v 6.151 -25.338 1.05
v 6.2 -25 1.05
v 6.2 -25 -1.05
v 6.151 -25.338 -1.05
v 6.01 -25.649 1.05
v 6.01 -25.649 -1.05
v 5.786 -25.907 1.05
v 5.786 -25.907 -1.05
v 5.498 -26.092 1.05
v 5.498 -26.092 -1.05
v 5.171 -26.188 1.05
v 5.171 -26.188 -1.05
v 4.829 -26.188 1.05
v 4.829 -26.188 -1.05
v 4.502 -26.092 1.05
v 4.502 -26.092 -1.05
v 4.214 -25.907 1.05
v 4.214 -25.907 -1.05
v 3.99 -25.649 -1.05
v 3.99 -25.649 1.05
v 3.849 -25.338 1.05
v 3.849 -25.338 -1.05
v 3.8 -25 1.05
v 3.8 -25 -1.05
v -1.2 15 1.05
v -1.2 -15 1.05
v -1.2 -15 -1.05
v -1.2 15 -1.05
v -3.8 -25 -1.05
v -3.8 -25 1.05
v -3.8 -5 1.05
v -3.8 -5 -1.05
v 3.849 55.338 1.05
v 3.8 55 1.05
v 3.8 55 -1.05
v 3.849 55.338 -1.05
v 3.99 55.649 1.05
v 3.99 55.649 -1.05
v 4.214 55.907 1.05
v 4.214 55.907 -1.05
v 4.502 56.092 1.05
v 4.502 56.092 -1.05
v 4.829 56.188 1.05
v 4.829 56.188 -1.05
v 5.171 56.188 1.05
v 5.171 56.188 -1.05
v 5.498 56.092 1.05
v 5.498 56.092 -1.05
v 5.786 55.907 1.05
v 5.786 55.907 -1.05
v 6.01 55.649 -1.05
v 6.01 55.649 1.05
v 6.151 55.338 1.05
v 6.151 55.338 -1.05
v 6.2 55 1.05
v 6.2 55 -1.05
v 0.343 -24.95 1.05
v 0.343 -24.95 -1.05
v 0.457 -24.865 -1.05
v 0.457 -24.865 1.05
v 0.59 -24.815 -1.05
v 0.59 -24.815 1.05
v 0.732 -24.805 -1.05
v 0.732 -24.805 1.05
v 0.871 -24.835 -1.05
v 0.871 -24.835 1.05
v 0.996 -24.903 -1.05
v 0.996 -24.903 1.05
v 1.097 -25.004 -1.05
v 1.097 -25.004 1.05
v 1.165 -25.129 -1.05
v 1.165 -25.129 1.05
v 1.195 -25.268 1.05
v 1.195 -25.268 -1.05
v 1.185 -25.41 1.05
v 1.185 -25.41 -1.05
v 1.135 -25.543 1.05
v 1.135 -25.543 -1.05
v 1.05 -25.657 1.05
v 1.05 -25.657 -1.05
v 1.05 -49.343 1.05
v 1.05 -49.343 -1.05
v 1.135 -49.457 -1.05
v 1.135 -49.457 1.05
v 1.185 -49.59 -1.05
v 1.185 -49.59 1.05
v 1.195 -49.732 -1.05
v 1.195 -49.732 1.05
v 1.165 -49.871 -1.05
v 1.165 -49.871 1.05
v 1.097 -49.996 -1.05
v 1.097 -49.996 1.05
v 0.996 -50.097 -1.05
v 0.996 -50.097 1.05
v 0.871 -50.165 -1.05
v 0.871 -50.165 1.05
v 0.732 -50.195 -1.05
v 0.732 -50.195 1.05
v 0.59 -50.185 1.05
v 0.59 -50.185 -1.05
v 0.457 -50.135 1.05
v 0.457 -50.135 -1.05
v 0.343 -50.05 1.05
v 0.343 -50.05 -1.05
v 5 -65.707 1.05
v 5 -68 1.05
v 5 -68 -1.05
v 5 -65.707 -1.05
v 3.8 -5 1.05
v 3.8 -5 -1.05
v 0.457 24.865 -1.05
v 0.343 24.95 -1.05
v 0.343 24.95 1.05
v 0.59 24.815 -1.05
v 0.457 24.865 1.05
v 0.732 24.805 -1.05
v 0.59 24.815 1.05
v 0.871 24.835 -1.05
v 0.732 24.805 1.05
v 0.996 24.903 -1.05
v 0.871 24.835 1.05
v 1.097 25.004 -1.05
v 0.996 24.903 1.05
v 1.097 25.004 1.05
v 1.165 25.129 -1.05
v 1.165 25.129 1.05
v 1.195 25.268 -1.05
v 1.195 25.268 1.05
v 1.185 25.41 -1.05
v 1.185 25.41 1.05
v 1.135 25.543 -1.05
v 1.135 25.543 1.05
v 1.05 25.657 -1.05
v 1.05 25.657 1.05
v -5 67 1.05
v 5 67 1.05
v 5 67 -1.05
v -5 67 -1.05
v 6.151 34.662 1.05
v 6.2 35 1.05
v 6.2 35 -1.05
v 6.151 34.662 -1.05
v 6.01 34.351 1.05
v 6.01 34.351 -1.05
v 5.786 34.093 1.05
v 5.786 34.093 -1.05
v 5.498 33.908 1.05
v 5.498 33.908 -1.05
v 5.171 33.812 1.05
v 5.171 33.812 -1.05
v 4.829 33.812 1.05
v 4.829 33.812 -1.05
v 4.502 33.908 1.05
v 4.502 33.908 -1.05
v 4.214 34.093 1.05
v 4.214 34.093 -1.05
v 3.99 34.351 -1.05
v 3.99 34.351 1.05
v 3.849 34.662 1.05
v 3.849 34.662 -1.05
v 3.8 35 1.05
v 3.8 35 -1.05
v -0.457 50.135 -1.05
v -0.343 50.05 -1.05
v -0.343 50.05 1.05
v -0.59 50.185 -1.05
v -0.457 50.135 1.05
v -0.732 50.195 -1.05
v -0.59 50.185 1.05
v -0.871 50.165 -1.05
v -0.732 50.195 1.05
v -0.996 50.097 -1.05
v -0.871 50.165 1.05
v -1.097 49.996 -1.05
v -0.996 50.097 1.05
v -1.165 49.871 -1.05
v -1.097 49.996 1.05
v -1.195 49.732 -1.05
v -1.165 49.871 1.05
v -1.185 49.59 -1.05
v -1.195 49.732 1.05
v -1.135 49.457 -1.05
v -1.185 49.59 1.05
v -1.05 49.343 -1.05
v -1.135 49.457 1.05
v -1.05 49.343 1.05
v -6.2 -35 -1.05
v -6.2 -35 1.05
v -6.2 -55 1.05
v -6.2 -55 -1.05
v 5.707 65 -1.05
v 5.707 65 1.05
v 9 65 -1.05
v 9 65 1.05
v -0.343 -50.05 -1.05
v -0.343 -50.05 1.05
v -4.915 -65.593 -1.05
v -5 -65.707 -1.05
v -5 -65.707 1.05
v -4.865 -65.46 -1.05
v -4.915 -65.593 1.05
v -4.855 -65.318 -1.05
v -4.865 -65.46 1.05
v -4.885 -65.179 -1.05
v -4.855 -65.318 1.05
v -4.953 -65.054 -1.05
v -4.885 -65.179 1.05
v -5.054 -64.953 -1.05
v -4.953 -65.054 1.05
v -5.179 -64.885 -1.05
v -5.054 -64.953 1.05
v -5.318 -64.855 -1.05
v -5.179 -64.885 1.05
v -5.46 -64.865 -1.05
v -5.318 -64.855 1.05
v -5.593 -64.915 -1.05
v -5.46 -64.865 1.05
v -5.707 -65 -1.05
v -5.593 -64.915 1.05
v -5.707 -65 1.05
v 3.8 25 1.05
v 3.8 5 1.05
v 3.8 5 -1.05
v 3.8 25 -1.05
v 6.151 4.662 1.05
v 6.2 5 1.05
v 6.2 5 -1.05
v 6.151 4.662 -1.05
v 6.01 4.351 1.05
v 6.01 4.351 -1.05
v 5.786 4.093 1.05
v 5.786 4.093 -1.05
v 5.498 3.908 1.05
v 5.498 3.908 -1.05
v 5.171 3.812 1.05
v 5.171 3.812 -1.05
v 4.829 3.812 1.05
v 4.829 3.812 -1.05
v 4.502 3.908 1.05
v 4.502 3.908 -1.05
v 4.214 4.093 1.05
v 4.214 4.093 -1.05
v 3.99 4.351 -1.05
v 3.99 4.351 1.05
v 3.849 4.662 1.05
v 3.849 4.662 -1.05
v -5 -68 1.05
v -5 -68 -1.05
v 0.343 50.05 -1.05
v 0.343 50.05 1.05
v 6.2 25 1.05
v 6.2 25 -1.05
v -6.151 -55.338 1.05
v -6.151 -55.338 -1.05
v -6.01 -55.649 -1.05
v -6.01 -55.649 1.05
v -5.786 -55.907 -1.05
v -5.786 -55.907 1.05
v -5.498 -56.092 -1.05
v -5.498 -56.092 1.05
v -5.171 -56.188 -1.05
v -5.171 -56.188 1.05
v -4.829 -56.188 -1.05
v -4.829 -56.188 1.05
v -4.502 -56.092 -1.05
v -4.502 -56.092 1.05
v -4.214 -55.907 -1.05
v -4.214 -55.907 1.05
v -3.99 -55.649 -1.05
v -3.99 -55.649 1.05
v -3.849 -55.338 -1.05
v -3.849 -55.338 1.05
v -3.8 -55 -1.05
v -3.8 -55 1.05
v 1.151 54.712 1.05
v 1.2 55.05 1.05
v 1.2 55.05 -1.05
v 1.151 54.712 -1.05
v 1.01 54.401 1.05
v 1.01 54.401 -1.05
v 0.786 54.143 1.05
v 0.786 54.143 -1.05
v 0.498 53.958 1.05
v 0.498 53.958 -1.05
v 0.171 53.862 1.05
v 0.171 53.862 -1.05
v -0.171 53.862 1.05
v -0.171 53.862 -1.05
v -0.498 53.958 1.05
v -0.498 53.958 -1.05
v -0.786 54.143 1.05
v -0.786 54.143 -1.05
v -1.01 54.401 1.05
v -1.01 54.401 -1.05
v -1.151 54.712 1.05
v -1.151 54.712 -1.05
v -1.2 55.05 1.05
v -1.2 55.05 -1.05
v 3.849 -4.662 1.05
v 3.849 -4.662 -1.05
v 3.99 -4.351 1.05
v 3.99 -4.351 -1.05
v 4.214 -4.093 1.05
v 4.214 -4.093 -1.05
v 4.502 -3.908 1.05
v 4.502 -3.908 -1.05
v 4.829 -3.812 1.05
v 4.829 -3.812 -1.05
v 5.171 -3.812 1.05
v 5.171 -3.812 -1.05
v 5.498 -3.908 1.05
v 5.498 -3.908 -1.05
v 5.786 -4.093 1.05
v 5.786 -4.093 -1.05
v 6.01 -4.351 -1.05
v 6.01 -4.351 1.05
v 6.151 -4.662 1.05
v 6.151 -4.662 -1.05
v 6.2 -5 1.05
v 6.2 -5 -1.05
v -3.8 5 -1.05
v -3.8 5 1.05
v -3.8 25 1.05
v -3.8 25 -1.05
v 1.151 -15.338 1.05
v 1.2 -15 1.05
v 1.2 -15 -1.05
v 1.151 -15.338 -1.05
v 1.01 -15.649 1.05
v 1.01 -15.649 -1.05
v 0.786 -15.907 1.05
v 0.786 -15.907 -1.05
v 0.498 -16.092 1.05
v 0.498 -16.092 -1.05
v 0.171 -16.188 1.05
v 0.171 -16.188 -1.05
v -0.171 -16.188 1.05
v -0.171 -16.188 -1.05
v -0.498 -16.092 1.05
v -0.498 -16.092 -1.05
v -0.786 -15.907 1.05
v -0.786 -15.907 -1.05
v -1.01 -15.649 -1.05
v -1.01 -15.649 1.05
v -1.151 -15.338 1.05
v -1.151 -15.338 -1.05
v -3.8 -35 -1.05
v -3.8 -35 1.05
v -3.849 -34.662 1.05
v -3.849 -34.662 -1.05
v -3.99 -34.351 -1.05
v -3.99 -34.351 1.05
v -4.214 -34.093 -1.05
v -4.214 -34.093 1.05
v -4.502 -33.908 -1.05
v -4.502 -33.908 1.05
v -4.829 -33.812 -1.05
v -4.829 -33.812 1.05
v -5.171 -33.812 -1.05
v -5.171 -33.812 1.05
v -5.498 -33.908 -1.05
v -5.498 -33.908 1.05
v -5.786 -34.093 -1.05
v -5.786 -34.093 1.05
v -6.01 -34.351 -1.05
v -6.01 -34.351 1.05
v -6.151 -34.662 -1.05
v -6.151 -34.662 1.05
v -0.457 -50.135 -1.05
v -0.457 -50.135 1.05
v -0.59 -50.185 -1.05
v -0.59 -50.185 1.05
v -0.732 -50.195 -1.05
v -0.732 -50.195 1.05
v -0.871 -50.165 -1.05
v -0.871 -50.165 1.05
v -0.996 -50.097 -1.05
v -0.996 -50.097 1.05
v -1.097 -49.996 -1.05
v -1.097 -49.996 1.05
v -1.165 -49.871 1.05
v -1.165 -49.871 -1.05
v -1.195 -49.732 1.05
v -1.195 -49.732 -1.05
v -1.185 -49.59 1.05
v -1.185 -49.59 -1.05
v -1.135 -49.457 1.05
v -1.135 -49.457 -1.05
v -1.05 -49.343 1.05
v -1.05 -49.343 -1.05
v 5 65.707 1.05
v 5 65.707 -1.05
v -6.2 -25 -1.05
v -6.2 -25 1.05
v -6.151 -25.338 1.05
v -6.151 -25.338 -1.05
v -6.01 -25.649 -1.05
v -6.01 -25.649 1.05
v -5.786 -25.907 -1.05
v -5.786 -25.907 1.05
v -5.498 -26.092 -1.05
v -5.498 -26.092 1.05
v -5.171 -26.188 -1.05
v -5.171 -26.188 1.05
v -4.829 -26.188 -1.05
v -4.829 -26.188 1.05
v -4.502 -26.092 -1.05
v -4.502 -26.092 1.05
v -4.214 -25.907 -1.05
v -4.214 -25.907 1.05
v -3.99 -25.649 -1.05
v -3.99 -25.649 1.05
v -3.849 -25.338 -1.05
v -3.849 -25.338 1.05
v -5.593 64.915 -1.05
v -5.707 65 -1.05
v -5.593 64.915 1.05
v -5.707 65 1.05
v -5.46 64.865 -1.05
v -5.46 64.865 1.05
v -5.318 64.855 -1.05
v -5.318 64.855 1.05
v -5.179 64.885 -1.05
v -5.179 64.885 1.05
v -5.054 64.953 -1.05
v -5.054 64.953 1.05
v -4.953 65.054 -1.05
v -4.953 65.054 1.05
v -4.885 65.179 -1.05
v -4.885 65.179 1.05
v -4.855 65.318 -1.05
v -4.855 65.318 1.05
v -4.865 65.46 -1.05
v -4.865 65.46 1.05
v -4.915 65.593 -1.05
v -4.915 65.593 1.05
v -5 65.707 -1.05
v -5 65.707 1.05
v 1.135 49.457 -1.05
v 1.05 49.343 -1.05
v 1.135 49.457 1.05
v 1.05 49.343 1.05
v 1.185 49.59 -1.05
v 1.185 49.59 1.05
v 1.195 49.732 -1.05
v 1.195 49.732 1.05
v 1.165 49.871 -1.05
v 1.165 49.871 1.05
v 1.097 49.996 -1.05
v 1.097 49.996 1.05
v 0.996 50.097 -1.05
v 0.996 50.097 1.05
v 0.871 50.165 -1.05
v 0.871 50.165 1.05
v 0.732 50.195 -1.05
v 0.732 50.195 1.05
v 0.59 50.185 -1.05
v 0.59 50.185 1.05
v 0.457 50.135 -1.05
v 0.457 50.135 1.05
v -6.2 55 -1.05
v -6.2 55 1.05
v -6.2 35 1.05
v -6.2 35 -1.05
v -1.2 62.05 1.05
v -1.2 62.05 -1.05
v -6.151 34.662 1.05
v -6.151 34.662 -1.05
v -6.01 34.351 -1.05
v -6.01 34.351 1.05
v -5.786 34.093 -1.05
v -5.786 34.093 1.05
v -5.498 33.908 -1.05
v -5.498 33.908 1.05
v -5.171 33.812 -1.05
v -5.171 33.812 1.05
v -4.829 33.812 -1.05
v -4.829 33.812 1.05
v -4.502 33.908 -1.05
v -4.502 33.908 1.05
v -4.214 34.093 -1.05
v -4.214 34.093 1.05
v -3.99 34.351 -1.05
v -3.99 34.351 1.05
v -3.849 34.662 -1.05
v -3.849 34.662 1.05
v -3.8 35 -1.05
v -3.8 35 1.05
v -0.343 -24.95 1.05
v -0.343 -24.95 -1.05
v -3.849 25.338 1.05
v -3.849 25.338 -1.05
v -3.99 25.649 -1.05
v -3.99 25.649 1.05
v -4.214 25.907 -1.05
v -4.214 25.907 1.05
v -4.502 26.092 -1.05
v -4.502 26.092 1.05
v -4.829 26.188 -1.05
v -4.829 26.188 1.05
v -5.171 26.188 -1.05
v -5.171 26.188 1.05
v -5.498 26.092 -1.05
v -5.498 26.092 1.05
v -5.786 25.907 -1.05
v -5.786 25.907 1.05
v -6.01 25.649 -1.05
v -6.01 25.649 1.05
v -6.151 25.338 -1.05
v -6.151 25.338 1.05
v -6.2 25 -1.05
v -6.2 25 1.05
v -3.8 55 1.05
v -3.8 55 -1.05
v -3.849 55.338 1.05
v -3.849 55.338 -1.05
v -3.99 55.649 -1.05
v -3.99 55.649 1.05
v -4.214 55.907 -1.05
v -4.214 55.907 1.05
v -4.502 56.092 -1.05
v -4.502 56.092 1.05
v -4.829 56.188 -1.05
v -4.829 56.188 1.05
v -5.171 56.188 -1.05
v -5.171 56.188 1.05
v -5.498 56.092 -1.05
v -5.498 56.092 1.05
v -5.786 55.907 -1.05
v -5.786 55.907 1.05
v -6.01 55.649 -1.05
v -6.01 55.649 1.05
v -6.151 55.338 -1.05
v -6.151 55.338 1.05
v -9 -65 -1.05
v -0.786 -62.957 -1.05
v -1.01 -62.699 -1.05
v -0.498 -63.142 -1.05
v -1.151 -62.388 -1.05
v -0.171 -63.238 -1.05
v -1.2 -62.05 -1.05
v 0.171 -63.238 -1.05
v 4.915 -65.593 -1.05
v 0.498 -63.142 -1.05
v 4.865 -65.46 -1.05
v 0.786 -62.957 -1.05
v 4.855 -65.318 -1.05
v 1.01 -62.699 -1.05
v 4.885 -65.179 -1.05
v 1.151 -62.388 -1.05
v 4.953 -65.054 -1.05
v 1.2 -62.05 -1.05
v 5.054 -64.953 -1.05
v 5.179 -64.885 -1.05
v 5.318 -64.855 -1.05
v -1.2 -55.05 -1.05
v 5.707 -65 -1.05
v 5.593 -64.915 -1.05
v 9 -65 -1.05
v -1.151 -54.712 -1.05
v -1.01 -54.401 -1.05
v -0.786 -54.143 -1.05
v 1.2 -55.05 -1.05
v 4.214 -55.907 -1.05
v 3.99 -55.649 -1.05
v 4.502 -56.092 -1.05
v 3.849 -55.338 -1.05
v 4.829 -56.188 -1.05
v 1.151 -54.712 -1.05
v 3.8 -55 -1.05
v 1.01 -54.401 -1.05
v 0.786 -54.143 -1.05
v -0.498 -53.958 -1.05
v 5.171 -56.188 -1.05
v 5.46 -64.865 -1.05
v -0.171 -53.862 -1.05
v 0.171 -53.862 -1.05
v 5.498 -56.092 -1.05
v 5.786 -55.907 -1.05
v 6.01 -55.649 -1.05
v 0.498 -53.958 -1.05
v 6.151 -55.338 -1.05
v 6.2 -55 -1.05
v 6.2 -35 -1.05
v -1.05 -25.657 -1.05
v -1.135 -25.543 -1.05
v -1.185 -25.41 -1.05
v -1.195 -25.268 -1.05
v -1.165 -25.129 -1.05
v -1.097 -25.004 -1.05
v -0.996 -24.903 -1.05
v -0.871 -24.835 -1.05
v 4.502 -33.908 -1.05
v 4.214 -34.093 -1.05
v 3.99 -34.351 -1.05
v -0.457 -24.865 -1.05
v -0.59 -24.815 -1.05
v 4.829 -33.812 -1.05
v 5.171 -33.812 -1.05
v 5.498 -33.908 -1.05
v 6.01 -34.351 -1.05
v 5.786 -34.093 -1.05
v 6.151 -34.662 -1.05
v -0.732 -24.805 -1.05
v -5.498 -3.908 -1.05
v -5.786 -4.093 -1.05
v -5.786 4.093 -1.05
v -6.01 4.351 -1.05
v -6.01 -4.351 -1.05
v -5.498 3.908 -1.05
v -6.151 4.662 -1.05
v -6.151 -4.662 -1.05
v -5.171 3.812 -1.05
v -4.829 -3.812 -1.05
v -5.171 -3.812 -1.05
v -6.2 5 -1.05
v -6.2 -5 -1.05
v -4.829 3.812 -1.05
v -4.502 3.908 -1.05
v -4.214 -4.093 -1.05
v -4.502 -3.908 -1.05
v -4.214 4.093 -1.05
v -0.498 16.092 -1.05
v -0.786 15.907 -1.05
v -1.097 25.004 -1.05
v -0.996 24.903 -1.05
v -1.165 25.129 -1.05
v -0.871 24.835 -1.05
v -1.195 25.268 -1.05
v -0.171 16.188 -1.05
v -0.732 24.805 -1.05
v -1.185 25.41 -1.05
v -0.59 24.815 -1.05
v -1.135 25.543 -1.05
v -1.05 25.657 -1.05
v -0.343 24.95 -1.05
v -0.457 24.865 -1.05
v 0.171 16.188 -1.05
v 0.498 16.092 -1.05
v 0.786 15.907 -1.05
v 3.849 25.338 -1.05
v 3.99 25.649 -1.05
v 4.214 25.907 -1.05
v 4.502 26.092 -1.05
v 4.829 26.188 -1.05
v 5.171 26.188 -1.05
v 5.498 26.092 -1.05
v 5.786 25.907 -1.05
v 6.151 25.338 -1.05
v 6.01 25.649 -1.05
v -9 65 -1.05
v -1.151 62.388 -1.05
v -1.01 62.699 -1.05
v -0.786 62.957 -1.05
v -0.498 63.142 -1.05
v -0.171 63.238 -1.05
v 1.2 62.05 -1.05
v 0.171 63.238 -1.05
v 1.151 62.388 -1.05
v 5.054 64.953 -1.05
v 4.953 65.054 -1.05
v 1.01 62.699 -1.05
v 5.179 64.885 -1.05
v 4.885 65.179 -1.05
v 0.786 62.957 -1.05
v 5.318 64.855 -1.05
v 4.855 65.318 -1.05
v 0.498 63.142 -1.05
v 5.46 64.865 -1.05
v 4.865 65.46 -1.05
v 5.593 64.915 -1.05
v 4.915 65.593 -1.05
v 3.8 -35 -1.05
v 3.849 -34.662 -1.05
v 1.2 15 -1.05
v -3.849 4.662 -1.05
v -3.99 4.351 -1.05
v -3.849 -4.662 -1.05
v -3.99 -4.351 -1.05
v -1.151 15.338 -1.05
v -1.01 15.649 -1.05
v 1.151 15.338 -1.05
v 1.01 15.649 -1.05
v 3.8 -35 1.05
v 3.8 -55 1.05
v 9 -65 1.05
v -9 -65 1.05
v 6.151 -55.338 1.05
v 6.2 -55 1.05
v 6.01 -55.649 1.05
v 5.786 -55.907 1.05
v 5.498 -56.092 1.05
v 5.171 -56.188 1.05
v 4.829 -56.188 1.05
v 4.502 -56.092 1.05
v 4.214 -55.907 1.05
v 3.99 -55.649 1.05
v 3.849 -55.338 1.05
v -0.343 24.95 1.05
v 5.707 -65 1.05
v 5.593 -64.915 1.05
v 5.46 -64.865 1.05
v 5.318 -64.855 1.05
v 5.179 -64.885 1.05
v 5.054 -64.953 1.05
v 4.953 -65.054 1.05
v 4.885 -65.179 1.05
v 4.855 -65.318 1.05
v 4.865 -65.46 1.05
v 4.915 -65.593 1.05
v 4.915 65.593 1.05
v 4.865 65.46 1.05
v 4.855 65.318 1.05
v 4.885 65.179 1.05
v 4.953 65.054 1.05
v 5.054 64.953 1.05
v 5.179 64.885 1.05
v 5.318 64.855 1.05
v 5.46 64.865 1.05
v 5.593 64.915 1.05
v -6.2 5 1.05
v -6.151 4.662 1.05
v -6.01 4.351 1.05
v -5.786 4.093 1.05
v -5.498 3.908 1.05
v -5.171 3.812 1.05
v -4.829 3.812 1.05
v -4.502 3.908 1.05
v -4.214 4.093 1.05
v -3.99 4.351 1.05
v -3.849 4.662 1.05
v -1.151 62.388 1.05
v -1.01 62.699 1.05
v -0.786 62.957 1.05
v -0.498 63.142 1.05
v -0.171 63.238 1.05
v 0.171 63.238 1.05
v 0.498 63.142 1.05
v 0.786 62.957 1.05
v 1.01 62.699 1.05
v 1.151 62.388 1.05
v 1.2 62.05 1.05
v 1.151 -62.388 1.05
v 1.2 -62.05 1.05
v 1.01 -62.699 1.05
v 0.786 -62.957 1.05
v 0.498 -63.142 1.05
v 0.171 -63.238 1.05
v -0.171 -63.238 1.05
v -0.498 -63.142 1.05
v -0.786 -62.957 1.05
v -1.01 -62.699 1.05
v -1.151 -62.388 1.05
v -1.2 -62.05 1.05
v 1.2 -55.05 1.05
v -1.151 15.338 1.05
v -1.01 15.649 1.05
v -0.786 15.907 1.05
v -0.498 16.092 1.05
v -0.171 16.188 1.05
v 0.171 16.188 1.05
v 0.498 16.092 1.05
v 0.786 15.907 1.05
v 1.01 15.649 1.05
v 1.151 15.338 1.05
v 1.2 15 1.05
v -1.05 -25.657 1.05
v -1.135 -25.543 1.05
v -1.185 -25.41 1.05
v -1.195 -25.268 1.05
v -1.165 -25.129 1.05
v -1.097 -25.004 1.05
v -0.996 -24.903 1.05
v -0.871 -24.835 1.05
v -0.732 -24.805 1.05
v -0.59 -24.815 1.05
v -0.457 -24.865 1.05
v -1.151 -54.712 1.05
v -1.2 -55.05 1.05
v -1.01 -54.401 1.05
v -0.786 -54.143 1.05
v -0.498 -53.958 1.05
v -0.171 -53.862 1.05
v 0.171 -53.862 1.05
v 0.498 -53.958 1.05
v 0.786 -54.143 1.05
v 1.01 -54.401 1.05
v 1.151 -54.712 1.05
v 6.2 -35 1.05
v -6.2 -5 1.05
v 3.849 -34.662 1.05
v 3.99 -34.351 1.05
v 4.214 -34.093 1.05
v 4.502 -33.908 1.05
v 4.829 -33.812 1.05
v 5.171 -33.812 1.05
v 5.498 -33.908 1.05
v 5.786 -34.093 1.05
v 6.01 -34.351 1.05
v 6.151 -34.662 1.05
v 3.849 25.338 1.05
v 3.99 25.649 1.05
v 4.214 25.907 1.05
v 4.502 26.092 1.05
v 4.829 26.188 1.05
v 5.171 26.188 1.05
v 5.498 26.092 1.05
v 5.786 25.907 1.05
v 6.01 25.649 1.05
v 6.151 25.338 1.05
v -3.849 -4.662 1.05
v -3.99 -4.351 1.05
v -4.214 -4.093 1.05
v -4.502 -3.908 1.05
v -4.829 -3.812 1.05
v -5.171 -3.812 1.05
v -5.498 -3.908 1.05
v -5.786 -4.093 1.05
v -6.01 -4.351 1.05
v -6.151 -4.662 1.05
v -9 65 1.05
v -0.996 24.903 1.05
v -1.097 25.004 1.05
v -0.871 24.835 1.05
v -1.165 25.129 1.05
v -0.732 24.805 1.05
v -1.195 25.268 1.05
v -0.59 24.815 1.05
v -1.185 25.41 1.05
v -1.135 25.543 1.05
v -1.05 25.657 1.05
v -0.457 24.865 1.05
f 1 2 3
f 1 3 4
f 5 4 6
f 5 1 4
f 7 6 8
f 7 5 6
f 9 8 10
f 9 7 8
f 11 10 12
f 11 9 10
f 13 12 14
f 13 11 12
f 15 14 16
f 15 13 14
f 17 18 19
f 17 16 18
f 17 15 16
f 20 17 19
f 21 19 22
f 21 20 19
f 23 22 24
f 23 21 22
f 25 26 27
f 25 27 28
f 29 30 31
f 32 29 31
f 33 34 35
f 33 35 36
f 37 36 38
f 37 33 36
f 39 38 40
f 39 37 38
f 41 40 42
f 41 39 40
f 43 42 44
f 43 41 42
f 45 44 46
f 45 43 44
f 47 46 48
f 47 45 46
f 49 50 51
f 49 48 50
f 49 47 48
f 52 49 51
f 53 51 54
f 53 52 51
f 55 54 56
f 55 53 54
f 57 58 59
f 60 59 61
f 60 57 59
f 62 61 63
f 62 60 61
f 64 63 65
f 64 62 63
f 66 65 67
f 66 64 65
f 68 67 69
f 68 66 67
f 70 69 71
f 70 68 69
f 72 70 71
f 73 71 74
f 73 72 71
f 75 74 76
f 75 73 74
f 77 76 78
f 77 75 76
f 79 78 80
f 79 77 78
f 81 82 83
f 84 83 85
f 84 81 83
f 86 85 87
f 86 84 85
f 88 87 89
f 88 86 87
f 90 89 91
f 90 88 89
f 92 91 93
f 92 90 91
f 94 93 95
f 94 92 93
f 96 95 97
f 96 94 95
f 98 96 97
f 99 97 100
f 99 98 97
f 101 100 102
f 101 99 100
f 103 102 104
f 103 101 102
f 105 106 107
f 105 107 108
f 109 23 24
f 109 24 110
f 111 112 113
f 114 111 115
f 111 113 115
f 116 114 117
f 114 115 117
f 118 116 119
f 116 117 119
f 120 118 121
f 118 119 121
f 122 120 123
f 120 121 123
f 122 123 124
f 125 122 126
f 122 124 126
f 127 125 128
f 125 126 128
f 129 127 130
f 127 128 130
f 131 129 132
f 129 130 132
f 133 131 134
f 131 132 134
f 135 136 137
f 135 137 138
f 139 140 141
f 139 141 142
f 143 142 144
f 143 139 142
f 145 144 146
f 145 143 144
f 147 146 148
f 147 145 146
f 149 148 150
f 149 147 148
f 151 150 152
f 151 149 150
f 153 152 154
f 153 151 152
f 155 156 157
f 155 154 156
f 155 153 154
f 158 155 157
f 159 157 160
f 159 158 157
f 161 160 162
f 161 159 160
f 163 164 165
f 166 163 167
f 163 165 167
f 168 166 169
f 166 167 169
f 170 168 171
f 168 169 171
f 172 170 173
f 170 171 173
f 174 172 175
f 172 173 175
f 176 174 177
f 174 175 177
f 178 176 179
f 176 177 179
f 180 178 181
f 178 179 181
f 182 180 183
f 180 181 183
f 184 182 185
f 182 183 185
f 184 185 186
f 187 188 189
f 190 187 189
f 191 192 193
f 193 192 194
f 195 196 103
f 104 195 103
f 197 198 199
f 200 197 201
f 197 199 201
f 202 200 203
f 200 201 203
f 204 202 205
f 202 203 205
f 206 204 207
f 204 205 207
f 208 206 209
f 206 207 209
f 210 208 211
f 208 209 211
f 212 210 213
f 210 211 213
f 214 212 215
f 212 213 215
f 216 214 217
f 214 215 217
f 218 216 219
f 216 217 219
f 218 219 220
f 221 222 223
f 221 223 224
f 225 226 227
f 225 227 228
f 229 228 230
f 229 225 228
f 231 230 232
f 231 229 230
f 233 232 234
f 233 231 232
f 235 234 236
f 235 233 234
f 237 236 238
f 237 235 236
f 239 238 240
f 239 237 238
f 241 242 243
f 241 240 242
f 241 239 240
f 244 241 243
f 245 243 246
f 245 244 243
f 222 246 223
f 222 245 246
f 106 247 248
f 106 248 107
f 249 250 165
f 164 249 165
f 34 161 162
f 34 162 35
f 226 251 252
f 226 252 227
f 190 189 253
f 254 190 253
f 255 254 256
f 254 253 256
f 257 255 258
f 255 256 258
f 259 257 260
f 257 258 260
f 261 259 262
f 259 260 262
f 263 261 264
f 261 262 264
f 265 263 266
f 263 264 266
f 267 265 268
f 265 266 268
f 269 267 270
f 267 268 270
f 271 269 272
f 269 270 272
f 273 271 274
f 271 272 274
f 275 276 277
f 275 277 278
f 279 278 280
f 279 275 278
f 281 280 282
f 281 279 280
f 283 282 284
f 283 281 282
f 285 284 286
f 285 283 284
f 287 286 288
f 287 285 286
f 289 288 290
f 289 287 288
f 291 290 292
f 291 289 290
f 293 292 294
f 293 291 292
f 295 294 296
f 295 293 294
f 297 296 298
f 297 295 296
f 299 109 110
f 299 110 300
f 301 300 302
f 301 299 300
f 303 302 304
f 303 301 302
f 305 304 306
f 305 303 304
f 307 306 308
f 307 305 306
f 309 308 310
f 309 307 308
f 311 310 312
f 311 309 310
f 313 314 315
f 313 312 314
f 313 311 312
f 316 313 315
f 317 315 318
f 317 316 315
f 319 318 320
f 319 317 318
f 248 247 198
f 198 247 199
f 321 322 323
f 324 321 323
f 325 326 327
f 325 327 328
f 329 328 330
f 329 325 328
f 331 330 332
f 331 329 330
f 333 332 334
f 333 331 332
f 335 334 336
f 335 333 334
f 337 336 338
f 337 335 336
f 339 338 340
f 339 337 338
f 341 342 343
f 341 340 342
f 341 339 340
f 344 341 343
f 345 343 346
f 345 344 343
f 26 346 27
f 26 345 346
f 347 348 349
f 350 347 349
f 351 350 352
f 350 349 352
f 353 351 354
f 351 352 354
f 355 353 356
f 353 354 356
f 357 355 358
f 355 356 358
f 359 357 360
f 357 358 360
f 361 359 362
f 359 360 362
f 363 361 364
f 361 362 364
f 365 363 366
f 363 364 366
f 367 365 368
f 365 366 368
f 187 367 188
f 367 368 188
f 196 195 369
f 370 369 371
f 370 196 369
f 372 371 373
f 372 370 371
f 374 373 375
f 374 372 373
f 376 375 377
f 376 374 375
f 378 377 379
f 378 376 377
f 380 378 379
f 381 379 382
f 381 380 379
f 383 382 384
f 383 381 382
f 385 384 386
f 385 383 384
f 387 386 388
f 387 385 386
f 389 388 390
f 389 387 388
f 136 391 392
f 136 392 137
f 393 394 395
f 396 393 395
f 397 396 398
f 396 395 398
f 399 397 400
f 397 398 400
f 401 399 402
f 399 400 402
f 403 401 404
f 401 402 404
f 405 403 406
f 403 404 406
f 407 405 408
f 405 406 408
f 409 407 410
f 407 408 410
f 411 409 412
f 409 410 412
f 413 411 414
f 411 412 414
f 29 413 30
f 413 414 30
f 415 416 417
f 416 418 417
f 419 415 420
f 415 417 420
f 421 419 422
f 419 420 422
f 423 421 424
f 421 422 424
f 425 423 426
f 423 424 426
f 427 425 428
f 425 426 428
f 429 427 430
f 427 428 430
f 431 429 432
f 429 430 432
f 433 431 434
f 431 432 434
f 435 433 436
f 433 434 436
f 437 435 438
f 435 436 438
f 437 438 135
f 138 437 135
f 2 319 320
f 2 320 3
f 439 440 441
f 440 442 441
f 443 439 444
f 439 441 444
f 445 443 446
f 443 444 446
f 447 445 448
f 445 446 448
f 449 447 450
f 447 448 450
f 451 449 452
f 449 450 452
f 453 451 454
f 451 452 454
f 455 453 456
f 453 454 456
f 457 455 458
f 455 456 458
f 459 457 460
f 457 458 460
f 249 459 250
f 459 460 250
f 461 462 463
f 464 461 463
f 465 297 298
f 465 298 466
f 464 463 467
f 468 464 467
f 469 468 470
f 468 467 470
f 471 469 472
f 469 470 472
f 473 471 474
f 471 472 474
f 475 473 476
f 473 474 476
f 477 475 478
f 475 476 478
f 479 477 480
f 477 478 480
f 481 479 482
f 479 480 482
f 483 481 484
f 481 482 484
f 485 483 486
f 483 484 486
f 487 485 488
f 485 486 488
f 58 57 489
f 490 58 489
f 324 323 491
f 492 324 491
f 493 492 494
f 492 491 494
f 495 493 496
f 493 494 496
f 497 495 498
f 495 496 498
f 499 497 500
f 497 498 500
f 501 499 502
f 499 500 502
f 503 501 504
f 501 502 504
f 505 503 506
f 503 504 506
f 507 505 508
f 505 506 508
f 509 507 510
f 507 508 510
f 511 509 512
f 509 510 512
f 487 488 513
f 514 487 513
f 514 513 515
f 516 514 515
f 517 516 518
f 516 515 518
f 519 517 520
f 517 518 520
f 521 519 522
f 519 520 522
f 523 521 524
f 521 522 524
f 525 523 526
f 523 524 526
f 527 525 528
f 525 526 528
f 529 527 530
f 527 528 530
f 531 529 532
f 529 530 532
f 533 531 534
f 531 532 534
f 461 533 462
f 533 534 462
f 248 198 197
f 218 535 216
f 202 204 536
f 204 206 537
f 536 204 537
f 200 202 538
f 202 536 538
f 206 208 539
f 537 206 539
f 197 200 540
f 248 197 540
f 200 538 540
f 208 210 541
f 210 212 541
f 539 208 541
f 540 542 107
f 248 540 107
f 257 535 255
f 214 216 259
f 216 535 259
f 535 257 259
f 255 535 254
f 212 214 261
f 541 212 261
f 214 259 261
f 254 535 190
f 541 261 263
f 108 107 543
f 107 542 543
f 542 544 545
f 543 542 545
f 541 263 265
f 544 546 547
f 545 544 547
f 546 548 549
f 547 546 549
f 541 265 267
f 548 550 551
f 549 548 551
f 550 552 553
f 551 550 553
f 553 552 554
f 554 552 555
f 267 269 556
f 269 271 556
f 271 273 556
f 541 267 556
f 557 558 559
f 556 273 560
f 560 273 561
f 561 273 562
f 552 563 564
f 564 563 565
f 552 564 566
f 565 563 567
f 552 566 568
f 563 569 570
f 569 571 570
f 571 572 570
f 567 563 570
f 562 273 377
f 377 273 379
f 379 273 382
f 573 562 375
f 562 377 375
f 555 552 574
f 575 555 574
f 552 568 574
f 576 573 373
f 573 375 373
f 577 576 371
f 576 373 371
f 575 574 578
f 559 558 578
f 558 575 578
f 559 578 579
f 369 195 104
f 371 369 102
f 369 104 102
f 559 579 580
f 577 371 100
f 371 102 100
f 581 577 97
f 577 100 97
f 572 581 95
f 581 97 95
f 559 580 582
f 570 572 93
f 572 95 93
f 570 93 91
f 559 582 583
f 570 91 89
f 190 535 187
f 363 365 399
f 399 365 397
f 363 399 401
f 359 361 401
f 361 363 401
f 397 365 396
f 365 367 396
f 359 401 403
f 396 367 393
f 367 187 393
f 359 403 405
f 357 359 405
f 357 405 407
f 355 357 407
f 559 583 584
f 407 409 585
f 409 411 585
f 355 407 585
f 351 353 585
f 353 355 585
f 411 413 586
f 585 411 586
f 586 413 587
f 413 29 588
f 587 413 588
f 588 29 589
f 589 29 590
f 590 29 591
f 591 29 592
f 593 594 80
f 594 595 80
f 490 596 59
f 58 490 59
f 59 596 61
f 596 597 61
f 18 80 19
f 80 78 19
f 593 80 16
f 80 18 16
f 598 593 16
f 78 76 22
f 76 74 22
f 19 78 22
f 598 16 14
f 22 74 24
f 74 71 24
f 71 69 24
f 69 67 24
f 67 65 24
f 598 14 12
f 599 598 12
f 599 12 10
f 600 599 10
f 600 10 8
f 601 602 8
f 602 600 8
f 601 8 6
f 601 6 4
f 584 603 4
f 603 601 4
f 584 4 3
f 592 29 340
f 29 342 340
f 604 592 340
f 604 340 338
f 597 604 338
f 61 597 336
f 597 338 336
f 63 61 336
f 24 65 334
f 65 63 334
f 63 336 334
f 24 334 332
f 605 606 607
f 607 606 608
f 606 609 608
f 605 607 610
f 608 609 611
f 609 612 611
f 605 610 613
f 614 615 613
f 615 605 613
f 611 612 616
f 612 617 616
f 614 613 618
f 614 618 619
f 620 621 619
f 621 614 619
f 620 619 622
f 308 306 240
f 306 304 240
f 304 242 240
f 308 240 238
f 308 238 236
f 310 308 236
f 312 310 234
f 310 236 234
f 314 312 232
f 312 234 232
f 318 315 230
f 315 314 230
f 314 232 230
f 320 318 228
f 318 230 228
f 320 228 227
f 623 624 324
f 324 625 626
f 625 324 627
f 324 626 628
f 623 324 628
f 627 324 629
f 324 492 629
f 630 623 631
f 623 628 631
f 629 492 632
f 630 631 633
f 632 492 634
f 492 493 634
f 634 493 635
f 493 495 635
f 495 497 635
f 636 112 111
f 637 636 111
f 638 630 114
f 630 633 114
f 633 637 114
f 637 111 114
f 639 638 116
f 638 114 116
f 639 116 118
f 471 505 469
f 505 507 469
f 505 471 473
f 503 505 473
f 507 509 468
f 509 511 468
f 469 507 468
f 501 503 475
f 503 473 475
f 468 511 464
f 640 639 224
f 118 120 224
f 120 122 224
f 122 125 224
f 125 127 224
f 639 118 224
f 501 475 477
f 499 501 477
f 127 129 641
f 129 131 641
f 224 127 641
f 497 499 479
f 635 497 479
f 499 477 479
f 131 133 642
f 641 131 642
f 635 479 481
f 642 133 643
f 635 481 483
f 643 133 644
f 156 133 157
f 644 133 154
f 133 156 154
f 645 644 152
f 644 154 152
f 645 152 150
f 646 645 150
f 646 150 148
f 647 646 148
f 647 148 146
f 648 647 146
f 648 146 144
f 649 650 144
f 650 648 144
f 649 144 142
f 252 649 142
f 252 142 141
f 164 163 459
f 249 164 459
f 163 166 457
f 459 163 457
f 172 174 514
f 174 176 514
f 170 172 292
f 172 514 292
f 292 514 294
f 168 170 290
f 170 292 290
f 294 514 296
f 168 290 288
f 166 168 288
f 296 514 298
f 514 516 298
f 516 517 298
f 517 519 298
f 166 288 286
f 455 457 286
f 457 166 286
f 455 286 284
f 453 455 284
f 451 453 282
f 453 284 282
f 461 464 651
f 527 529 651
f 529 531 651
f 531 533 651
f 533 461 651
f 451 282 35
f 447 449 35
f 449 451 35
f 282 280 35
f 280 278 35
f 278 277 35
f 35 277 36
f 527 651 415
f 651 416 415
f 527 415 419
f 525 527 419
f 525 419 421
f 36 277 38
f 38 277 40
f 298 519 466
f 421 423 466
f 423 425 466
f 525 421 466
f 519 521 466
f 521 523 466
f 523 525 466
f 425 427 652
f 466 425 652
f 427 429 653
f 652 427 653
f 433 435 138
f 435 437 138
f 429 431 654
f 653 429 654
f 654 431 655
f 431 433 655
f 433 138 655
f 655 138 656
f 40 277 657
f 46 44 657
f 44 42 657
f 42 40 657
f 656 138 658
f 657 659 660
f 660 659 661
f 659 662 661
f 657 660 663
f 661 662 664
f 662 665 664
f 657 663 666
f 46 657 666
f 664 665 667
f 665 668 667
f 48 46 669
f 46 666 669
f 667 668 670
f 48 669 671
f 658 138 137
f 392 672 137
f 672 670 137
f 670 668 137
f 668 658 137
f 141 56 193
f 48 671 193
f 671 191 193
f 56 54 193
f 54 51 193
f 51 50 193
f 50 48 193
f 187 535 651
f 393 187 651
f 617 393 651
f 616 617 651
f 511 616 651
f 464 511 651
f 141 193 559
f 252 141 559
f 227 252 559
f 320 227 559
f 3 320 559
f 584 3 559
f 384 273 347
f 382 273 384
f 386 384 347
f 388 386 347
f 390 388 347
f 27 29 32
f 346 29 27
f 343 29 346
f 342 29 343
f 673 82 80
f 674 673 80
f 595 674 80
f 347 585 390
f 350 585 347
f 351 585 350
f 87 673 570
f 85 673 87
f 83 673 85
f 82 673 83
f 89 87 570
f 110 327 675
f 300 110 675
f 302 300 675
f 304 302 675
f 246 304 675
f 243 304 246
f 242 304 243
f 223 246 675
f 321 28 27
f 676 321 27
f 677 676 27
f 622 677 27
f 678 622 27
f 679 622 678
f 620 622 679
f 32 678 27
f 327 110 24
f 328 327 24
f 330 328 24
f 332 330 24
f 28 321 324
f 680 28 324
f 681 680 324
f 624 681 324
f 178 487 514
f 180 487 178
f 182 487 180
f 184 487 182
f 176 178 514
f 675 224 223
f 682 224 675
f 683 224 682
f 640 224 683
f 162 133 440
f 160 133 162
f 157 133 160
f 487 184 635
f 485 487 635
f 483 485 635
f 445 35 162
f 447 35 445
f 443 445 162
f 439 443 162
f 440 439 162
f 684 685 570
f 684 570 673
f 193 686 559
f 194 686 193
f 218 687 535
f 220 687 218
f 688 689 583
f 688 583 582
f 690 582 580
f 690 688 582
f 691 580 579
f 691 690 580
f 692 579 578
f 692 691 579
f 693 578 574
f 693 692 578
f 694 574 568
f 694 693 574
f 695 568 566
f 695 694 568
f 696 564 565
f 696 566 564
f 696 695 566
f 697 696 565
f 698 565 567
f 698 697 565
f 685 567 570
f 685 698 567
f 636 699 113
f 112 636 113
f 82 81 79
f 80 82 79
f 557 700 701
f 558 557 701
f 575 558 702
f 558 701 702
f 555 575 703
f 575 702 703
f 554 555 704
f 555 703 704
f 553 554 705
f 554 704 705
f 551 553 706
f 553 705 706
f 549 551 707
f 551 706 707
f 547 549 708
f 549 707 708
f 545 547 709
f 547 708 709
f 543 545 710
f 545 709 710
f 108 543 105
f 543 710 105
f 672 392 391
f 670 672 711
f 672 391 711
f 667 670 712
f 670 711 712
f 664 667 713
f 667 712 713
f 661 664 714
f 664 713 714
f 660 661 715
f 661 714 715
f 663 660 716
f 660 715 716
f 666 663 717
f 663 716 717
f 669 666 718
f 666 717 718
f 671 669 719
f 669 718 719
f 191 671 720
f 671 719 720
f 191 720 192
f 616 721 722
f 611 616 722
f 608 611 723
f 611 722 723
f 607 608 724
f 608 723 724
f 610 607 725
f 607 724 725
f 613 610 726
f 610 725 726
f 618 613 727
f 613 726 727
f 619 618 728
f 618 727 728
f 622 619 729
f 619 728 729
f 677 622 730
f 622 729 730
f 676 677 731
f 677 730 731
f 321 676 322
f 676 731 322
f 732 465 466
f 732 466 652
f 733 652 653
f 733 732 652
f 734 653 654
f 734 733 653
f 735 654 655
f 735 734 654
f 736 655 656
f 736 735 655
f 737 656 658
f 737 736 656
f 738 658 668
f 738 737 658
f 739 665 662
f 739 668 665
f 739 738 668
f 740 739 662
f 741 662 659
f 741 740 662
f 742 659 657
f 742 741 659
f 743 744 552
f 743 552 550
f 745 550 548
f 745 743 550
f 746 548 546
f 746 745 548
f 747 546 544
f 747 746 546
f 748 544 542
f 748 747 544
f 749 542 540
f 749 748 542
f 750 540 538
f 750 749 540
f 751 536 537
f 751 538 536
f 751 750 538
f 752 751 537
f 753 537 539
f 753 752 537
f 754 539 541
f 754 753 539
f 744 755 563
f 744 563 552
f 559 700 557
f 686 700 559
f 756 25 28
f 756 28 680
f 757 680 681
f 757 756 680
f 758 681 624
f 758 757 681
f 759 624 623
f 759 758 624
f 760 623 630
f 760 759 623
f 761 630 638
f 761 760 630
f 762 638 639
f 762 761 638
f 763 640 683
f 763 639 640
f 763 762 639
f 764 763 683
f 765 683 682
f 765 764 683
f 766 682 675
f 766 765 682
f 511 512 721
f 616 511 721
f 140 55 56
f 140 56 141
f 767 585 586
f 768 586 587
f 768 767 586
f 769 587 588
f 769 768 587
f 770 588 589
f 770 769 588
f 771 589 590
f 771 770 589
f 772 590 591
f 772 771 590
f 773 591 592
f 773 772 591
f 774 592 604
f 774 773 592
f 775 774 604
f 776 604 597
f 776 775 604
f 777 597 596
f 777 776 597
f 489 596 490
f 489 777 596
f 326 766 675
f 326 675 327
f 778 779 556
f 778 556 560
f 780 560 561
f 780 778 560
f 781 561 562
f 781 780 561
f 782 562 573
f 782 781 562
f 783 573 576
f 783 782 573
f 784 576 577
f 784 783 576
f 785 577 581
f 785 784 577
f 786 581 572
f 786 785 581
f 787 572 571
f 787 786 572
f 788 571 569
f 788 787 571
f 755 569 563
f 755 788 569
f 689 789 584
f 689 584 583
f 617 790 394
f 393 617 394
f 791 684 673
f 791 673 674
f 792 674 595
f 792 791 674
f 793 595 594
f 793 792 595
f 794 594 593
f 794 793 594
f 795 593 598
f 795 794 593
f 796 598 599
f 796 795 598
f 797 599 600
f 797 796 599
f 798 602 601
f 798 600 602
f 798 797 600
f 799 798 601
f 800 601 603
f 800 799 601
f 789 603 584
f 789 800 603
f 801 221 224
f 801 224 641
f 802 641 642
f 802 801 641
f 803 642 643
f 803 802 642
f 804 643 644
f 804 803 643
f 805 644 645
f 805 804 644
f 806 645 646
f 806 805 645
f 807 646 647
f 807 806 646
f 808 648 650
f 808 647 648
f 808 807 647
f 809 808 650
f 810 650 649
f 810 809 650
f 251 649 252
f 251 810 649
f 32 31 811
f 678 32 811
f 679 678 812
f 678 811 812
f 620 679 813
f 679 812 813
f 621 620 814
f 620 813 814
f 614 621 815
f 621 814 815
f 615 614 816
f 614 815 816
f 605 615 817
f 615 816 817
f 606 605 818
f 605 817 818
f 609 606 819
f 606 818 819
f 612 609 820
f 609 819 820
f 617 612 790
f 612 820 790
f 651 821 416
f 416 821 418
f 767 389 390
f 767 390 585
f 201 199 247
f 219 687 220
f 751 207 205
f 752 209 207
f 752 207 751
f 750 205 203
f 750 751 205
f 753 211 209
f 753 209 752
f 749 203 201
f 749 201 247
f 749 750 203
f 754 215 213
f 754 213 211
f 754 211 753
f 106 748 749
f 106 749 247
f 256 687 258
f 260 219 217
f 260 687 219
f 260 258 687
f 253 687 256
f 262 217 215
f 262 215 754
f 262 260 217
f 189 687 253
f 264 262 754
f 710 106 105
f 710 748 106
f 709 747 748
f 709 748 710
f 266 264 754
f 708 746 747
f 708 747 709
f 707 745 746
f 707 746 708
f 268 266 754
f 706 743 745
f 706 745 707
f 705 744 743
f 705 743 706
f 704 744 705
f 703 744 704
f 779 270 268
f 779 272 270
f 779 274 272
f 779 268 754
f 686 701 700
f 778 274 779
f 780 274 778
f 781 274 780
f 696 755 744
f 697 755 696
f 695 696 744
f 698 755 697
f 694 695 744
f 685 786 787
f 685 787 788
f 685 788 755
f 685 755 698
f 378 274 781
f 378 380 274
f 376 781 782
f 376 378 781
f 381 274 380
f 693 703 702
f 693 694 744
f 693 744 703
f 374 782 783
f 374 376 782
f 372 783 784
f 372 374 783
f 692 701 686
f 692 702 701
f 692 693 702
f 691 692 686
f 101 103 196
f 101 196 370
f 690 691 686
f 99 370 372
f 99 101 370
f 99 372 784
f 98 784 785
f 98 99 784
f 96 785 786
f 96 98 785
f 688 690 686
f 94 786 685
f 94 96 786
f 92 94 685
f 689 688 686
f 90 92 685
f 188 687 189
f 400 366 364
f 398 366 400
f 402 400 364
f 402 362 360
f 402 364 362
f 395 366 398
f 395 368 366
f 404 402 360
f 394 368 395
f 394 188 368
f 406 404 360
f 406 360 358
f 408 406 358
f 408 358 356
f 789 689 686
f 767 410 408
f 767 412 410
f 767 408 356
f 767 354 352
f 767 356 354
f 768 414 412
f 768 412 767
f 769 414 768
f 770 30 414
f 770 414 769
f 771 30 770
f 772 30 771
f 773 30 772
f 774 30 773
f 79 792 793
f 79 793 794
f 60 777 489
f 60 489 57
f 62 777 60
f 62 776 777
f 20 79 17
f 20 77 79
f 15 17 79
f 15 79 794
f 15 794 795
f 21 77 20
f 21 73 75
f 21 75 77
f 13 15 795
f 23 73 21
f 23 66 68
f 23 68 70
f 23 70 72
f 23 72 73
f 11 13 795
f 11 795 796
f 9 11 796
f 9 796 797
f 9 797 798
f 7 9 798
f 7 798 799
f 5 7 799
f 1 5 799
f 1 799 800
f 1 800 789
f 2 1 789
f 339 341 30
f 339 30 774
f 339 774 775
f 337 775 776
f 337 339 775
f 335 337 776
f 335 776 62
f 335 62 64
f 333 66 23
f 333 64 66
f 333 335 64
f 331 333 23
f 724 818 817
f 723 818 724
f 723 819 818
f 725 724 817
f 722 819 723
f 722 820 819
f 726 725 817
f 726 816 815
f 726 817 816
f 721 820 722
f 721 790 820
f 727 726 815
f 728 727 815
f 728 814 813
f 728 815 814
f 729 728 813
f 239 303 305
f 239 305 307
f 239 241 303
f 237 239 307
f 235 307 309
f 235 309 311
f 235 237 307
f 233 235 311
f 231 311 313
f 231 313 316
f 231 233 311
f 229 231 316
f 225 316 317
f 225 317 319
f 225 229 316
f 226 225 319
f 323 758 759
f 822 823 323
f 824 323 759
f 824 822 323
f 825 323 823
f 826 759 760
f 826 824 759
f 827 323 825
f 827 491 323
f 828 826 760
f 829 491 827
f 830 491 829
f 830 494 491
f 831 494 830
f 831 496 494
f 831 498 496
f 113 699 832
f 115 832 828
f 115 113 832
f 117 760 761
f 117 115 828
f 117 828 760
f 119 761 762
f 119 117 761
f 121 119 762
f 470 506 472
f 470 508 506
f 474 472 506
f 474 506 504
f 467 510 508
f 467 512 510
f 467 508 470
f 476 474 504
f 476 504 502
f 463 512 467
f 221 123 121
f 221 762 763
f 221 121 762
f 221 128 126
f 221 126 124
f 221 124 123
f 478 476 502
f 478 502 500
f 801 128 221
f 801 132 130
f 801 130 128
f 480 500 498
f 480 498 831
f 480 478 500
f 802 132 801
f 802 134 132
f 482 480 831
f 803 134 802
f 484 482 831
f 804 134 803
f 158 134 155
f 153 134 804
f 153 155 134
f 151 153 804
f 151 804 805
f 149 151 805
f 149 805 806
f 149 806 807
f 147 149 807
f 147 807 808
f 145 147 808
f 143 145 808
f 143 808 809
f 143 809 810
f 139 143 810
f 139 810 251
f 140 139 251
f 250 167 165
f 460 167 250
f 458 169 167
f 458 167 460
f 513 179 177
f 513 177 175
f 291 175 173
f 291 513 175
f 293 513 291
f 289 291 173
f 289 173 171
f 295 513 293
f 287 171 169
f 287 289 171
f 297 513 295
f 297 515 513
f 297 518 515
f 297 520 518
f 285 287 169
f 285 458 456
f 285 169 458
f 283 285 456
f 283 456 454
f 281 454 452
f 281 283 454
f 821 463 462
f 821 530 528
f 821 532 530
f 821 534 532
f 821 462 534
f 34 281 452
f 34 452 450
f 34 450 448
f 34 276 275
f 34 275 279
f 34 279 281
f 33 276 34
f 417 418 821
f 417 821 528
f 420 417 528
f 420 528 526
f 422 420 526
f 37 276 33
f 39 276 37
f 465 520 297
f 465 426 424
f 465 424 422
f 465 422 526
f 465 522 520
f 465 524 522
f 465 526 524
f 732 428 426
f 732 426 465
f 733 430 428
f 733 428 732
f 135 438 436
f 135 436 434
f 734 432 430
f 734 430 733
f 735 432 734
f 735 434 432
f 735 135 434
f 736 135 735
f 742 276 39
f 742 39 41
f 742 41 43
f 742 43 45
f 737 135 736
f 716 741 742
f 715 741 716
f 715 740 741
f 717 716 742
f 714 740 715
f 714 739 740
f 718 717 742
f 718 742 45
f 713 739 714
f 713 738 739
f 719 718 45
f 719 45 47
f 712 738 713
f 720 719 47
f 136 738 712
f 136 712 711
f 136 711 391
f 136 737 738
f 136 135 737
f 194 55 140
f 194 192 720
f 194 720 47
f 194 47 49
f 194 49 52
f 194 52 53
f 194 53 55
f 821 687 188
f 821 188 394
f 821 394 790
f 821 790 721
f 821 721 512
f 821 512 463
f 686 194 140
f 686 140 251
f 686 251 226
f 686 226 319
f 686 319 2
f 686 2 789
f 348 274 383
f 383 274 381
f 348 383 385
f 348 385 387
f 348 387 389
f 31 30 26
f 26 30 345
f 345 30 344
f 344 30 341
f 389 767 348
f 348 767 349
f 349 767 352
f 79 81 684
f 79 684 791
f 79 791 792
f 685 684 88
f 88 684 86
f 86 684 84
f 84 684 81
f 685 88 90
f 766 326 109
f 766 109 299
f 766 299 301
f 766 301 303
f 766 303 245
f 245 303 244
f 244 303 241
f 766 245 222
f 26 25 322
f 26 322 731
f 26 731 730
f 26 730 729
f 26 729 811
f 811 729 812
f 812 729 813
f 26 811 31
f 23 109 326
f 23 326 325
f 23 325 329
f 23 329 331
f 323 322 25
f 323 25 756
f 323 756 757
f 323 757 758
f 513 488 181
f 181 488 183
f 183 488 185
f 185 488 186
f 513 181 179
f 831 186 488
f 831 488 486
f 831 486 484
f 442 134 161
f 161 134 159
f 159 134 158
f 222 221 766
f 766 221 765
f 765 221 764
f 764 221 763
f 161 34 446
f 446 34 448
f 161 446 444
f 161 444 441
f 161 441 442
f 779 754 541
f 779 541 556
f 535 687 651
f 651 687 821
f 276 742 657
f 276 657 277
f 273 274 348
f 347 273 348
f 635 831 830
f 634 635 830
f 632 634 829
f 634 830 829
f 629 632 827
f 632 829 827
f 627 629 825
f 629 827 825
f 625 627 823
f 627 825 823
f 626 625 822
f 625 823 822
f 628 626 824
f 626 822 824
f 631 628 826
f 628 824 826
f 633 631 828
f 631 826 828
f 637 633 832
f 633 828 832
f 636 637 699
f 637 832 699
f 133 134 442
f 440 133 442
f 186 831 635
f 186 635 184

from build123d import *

# Parameters (mm, degrees)
SKETCH_1_W          = 18
SKETCH_1_H          = 130
SKETCH_1_W_2        = 5
SKETCH_1_H_2        = 2
SKETCH_1_H_3        = 3
EXTRUDE_1_DEPTH     = 1.05
SKETCH_5_R          = 0.5
CUT_EXTRUDE_3_DEPTH = 69.625141166
SKETCH_2_W          = 1.05
SKETCH_2_H          = 25.1
CUT_EXTRUDE_1_DEPTH = 10
SKETCH_6_R          = 0.5
CUT_EXTRUDE_4_DEPTH = 69.625141166
CUT_EXTRUDE_5_DEPTH = 69.625141166
CUT_EXTRUDE_6_DEPTH = 69.625141166


with BuildPart() as part:
    # 草图1 → 凸台-拉伸1 (new, symmetric)
    with BuildSketch(Plane.XY):
        Rectangle(SKETCH_1_W, SKETCH_1_H)
        with Locations((-2.5, 66)):
            Rectangle(SKETCH_1_W_2, SKETCH_1_H_2)
        with Locations((2.5, 66)):
            Rectangle(SKETCH_1_W_2, SKETCH_1_H_2)
        with Locations((2.5, -66.5)):
            Rectangle(SKETCH_1_W_2, SKETCH_1_H_3)
        with Locations((-2.5, -66.5)):
            Rectangle(SKETCH_1_W_2, SKETCH_1_H_3)
    extrude(amount=EXTRUDE_1_DEPTH, both=True)

    # 草图5 → 切除-拉伸3 (cut, through all)
    with BuildSketch(Plane.XY.offset(1.05)):
        with Locations((5.353553391, 65.353553391)):
            Circle(SKETCH_5_R)
        with Locations((-5.353553391, 65.353553391)):
            Circle(SKETCH_5_R)
        with Locations((5.353553391, -65.353553391)):
            Circle(SKETCH_5_R)
        with Locations((-5.353553391, -65.353553391)):
            Circle(SKETCH_5_R)
    extrude(amount=-CUT_EXTRUDE_3_DEPTH, mode=Mode.SUBTRACT)

    # 草图2 → 切除-拉伸1 (cut)
    with BuildSketch(Plane.XY.offset(1.05)):
        with Locations((0.525, 37.5)):
            Rectangle(SKETCH_2_W, SKETCH_2_H)
        with Locations((-0.525, 37.5)):
            Rectangle(SKETCH_2_W, SKETCH_2_H)
        with Locations((0.525, -37.5)):
            Rectangle(SKETCH_2_W, SKETCH_2_H)
        with Locations((-0.525, -37.5)):
            Rectangle(SKETCH_2_W, SKETCH_2_H)
    extrude(amount=-CUT_EXTRUDE_1_DEPTH, mode=Mode.SUBTRACT)

    # 草图6 → 切除-拉伸4 (cut, through all)
    with BuildSketch(Plane.XY.offset(1.05)):
        with Locations((0.696446609, 49.696446609)):
            Circle(SKETCH_6_R)
        with Locations((-0.696446609, 49.696446609)):
            Circle(SKETCH_6_R)
        with Locations((0.696446609, 25.303553391)):
            Circle(SKETCH_6_R)
        with Locations((-0.696446609, 25.303553391)):
            Circle(SKETCH_6_R)
    cut_extrude_4 = extrude(amount=-CUT_EXTRUDE_4_DEPTH, mode=Mode.SUBTRACT)

    # 镜向1: 切除-拉伸4 across plane
    add(cut_extrude_4.mirror(Plane.ZX), mode=Mode.SUBTRACT)

    # 草图4 → 切除-拉伸5 (cut, through all)
    with BuildSketch(Plane.XY.offset(1.05)):
        with BuildLine():
            Line((6.2, 55), (6.2, 35))
            ThreePointArc((6.2, 35), (5, 33.8), (3.8, 35))
            Line((3.8, 35), (3.8, 55))
            ThreePointArc((3.8, 55), (5, 56.2), (6.2, 55))
        make_face()
        with BuildLine():
            Line((6.2, 25), (6.2, 5))
            ThreePointArc((6.2, 5), (5, 3.8), (3.8, 5))
            Line((3.8, 5), (3.8, 25))
            ThreePointArc((3.8, 25), (5, 26.2), (6.2, 25))
        make_face()
        with BuildLine():
            Line((6.2, -5), (6.2, -25))
            ThreePointArc((6.2, -25), (5, -26.2), (3.8, -25))
            Line((3.8, -25), (3.8, -5))
            ThreePointArc((3.8, -5), (5, -3.8), (6.2, -5))
        make_face()
        with BuildLine():
            Line((3.8, -55), (3.8, -35))
            ThreePointArc((3.8, -35), (5, -33.8), (6.2, -35))
            Line((6.2, -35), (6.2, -55))
            ThreePointArc((6.2, -55), (5, -56.2), (3.8, -55))
        make_face()
    cut_extrude_5 = extrude(amount=-CUT_EXTRUDE_5_DEPTH, mode=Mode.SUBTRACT)

    # 镜向2: 切除-拉伸5 across plane
    add(cut_extrude_5.mirror(Plane(origin=(0, 0, 0), x_dir=(0, 0, 1), z_dir=(1, 0, 0))), mode=Mode.SUBTRACT)

    # 草图7 → 切除-拉伸6 (cut, through all)
    with BuildSketch(Plane.XY.offset(1.05)):
        with BuildLine():
            Line((1.2, 62.05), (1.2, 55.05))
            ThreePointArc((1.2, 55.05), (0, 53.85), (-1.2, 55.05))
            Line((-1.2, 55.05), (-1.2, 62.05))
            ThreePointArc((-1.2, 62.05), (0, 63.25), (1.2, 62.05))
        make_face()
        with BuildLine():
            Line((1.2, 15), (1.2, -15))
            ThreePointArc((1.2, -15), (0, -16.2), (-1.2, -15))
            Line((-1.2, -15), (-1.2, 15))
            ThreePointArc((-1.2, 15), (0, 16.2), (1.2, 15))
        make_face()
        with BuildLine():
            Line((1.2, -55.05), (1.2, -62.05))
            ThreePointArc((1.2, -62.05), (0, -63.25), (-1.2, -62.05))
            Line((-1.2, -62.05), (-1.2, -55.05))
            ThreePointArc((-1.2, -55.05), (0, -53.85), (1.2, -55.05))
        make_face()
    extrude(amount=-CUT_EXTRUDE_6_DEPTH, mode=Mode.SUBTRACT)


solid = part.part
